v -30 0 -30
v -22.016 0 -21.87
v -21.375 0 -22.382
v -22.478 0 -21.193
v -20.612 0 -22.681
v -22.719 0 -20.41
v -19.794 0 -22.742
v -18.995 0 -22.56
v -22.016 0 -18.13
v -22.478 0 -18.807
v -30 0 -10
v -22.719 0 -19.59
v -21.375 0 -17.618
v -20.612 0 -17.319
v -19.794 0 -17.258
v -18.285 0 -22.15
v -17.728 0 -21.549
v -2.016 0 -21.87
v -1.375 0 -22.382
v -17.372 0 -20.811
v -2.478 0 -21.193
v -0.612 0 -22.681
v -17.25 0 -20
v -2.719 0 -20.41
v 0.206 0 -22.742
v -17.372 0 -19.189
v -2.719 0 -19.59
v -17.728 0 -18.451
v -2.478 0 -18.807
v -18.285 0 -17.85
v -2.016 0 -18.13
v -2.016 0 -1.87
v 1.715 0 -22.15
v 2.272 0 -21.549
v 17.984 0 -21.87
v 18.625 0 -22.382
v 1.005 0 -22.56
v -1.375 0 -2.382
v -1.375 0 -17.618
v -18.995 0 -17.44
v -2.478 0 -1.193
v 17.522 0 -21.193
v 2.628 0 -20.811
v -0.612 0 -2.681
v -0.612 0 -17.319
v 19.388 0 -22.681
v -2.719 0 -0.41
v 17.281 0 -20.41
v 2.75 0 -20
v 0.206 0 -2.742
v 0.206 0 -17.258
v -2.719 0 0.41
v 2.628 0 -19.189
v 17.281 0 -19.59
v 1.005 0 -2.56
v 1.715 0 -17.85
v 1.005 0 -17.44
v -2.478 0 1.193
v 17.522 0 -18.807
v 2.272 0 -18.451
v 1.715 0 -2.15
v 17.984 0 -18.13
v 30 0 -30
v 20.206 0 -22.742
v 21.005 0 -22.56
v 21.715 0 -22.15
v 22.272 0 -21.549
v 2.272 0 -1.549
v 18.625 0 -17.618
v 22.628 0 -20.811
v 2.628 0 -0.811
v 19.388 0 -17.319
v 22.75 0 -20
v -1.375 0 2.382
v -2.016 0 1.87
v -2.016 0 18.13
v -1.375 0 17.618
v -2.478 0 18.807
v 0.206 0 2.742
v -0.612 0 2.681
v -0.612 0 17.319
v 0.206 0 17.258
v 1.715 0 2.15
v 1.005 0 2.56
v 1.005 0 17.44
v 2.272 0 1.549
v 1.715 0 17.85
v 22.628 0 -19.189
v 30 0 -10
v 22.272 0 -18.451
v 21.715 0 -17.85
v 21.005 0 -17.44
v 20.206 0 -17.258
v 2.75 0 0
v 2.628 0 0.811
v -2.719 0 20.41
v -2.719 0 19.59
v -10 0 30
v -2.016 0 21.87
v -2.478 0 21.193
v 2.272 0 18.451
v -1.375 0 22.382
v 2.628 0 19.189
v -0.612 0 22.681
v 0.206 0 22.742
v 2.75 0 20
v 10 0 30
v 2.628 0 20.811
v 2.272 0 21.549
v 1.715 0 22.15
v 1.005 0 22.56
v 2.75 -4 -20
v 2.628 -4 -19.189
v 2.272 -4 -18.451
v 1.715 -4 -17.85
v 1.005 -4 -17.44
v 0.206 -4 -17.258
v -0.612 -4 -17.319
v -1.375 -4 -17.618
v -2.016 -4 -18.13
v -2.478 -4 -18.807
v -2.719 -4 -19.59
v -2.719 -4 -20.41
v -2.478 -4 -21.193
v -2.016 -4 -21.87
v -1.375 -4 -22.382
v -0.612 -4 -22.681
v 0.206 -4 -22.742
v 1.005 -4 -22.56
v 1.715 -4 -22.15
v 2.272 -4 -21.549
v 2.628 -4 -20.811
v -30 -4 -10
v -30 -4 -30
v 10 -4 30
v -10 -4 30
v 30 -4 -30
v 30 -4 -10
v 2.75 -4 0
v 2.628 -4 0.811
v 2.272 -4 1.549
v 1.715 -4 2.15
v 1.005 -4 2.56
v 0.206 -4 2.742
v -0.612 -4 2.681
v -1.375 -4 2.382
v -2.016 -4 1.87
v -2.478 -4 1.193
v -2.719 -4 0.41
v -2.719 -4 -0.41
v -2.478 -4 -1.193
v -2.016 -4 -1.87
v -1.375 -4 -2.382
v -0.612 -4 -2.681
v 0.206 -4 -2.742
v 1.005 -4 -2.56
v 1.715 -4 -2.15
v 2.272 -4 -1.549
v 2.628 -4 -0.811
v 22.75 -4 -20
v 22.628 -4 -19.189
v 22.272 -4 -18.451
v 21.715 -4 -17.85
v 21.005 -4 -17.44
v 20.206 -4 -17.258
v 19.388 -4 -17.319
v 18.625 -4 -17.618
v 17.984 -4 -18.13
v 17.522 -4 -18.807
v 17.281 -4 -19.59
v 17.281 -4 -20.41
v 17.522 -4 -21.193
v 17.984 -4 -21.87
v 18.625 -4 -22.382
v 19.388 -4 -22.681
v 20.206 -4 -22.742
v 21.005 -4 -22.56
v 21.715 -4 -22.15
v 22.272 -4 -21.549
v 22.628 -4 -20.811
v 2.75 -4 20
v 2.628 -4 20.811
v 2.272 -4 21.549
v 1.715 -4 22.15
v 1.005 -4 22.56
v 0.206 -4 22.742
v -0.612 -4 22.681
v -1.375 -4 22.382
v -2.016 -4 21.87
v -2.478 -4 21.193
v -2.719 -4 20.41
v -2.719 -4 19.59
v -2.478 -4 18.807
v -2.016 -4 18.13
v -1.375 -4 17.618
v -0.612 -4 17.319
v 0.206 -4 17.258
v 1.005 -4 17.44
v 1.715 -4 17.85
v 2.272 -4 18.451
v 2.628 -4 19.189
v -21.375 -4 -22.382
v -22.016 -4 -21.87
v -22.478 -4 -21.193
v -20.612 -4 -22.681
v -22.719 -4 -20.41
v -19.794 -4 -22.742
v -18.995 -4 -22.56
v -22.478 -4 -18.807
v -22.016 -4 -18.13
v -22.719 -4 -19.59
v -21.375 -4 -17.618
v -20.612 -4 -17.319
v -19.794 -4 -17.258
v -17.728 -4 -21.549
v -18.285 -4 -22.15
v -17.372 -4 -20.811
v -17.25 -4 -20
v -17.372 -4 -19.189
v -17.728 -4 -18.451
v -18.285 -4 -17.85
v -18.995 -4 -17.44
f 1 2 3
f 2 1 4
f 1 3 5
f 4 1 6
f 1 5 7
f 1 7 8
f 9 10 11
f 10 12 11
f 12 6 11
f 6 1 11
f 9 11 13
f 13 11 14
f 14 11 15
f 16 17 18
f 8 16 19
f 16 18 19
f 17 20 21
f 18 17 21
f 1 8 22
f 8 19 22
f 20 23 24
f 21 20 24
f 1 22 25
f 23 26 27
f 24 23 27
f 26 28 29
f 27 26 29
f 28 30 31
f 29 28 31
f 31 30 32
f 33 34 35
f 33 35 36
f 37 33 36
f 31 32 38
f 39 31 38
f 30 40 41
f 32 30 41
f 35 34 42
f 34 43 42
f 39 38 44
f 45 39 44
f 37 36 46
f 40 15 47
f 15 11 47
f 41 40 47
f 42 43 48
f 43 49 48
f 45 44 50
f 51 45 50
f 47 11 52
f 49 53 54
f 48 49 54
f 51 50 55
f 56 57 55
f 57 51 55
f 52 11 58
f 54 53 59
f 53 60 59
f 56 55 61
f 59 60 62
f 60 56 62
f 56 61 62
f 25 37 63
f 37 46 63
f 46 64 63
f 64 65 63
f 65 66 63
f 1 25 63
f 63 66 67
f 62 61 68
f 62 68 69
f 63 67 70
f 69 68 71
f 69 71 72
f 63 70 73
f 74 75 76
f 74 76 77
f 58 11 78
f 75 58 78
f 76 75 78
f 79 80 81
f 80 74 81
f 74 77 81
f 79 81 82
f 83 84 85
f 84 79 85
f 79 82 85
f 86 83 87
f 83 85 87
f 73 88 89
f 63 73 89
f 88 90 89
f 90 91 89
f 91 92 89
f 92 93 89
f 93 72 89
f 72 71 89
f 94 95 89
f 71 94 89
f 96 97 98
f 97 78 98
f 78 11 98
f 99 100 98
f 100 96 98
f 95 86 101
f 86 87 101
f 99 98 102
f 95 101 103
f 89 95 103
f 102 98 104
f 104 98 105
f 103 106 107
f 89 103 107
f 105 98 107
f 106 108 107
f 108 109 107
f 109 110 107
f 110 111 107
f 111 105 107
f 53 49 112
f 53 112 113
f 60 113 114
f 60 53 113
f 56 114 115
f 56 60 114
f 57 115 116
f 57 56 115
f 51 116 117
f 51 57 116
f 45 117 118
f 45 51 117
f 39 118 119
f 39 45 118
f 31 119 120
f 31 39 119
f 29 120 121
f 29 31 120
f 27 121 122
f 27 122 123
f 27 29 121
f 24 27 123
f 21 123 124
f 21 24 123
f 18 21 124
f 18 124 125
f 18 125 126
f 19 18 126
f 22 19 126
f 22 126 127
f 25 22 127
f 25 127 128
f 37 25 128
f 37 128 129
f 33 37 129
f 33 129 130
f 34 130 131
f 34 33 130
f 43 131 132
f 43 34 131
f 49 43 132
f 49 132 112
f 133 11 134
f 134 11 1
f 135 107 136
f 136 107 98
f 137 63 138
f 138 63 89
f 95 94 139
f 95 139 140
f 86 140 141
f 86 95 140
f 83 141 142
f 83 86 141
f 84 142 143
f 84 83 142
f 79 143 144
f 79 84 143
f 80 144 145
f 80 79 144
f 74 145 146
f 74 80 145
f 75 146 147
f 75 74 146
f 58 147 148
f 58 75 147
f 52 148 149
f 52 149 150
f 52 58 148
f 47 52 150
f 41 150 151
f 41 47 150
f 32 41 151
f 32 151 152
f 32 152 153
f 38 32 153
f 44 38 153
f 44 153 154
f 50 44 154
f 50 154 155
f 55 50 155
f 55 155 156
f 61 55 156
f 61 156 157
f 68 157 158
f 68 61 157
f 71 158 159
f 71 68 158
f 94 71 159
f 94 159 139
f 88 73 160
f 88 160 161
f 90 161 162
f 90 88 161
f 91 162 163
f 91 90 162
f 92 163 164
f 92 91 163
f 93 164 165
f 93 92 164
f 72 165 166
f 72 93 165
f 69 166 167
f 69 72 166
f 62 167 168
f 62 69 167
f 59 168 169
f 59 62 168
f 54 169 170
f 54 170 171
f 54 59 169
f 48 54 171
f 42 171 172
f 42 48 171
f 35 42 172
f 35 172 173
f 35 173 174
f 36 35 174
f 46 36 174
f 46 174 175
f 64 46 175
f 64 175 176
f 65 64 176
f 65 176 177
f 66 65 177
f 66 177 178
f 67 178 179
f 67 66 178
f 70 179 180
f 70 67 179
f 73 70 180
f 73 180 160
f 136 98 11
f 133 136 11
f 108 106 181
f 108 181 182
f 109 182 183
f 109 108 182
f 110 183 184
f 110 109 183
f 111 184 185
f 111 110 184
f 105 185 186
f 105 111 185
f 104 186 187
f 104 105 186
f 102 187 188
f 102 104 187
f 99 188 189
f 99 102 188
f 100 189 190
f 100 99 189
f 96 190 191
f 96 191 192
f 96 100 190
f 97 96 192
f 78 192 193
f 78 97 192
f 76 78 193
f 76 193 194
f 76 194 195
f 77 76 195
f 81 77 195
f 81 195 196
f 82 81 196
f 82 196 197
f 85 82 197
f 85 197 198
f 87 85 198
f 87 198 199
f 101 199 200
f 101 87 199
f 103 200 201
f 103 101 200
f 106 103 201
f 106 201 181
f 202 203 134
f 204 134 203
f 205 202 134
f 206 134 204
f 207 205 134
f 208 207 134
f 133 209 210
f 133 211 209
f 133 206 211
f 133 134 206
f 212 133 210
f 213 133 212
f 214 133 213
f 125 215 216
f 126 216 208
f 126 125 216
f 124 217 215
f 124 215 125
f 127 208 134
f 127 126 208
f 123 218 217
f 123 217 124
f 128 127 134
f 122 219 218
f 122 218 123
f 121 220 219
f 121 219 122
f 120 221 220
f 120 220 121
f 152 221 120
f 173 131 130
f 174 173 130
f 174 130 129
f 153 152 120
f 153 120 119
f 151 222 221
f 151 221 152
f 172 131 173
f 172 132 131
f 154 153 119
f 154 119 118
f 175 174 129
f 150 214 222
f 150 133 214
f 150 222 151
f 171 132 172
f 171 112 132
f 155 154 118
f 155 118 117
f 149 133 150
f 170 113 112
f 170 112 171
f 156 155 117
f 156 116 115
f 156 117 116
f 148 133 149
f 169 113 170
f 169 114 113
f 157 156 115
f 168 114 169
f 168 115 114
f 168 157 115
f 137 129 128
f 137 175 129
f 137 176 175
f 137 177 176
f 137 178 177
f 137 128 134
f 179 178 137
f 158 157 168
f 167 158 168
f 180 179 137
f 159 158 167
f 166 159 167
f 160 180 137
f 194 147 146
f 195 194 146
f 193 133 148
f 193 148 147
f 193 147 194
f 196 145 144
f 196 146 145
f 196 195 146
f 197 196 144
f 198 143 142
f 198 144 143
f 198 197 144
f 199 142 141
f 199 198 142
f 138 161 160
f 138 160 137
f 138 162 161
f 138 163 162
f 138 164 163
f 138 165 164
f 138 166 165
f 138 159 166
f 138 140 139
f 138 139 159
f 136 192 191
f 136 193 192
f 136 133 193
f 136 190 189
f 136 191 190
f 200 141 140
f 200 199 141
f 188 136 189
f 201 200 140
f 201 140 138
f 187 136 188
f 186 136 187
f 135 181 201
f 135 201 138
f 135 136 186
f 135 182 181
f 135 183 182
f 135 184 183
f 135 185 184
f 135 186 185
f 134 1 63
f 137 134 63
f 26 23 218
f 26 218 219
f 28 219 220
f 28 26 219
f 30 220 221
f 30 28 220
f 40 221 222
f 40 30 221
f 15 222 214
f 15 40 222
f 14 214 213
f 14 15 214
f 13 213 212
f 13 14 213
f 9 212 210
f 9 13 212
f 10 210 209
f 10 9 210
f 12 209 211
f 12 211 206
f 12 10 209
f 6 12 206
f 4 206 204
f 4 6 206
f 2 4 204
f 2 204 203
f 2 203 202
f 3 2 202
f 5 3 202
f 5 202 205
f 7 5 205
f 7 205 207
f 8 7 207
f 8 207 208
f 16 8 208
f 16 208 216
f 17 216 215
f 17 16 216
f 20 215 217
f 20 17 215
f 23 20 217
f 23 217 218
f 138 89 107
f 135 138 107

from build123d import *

# Parameters (mm, degrees)
F0_R     = 2.75
F1_DEPTH = 4


with BuildPart() as f1:
    # F0 (on Front) → F1 (new body)
    with BuildSketch(Plane.XZ):
        Polygon((-30, -10), (-30, -30), (30, -30), (30, -10), (10, 30), (-10, 30), align=None)
        with Locations((-20, -20)):
            Circle(F0_R, mode=Mode.SUBTRACT)
        with Locations((0, -20)):
            Circle(F0_R, mode=Mode.SUBTRACT)
        with Locations((20, -20)):
            Circle(F0_R, mode=Mode.SUBTRACT)
        Circle(F0_R, mode=Mode.SUBTRACT)
        with Locations((0, 20)):
            Circle(F0_R, mode=Mode.SUBTRACT)
    extrude(amount=F1_DEPTH)


solid = f1.part
